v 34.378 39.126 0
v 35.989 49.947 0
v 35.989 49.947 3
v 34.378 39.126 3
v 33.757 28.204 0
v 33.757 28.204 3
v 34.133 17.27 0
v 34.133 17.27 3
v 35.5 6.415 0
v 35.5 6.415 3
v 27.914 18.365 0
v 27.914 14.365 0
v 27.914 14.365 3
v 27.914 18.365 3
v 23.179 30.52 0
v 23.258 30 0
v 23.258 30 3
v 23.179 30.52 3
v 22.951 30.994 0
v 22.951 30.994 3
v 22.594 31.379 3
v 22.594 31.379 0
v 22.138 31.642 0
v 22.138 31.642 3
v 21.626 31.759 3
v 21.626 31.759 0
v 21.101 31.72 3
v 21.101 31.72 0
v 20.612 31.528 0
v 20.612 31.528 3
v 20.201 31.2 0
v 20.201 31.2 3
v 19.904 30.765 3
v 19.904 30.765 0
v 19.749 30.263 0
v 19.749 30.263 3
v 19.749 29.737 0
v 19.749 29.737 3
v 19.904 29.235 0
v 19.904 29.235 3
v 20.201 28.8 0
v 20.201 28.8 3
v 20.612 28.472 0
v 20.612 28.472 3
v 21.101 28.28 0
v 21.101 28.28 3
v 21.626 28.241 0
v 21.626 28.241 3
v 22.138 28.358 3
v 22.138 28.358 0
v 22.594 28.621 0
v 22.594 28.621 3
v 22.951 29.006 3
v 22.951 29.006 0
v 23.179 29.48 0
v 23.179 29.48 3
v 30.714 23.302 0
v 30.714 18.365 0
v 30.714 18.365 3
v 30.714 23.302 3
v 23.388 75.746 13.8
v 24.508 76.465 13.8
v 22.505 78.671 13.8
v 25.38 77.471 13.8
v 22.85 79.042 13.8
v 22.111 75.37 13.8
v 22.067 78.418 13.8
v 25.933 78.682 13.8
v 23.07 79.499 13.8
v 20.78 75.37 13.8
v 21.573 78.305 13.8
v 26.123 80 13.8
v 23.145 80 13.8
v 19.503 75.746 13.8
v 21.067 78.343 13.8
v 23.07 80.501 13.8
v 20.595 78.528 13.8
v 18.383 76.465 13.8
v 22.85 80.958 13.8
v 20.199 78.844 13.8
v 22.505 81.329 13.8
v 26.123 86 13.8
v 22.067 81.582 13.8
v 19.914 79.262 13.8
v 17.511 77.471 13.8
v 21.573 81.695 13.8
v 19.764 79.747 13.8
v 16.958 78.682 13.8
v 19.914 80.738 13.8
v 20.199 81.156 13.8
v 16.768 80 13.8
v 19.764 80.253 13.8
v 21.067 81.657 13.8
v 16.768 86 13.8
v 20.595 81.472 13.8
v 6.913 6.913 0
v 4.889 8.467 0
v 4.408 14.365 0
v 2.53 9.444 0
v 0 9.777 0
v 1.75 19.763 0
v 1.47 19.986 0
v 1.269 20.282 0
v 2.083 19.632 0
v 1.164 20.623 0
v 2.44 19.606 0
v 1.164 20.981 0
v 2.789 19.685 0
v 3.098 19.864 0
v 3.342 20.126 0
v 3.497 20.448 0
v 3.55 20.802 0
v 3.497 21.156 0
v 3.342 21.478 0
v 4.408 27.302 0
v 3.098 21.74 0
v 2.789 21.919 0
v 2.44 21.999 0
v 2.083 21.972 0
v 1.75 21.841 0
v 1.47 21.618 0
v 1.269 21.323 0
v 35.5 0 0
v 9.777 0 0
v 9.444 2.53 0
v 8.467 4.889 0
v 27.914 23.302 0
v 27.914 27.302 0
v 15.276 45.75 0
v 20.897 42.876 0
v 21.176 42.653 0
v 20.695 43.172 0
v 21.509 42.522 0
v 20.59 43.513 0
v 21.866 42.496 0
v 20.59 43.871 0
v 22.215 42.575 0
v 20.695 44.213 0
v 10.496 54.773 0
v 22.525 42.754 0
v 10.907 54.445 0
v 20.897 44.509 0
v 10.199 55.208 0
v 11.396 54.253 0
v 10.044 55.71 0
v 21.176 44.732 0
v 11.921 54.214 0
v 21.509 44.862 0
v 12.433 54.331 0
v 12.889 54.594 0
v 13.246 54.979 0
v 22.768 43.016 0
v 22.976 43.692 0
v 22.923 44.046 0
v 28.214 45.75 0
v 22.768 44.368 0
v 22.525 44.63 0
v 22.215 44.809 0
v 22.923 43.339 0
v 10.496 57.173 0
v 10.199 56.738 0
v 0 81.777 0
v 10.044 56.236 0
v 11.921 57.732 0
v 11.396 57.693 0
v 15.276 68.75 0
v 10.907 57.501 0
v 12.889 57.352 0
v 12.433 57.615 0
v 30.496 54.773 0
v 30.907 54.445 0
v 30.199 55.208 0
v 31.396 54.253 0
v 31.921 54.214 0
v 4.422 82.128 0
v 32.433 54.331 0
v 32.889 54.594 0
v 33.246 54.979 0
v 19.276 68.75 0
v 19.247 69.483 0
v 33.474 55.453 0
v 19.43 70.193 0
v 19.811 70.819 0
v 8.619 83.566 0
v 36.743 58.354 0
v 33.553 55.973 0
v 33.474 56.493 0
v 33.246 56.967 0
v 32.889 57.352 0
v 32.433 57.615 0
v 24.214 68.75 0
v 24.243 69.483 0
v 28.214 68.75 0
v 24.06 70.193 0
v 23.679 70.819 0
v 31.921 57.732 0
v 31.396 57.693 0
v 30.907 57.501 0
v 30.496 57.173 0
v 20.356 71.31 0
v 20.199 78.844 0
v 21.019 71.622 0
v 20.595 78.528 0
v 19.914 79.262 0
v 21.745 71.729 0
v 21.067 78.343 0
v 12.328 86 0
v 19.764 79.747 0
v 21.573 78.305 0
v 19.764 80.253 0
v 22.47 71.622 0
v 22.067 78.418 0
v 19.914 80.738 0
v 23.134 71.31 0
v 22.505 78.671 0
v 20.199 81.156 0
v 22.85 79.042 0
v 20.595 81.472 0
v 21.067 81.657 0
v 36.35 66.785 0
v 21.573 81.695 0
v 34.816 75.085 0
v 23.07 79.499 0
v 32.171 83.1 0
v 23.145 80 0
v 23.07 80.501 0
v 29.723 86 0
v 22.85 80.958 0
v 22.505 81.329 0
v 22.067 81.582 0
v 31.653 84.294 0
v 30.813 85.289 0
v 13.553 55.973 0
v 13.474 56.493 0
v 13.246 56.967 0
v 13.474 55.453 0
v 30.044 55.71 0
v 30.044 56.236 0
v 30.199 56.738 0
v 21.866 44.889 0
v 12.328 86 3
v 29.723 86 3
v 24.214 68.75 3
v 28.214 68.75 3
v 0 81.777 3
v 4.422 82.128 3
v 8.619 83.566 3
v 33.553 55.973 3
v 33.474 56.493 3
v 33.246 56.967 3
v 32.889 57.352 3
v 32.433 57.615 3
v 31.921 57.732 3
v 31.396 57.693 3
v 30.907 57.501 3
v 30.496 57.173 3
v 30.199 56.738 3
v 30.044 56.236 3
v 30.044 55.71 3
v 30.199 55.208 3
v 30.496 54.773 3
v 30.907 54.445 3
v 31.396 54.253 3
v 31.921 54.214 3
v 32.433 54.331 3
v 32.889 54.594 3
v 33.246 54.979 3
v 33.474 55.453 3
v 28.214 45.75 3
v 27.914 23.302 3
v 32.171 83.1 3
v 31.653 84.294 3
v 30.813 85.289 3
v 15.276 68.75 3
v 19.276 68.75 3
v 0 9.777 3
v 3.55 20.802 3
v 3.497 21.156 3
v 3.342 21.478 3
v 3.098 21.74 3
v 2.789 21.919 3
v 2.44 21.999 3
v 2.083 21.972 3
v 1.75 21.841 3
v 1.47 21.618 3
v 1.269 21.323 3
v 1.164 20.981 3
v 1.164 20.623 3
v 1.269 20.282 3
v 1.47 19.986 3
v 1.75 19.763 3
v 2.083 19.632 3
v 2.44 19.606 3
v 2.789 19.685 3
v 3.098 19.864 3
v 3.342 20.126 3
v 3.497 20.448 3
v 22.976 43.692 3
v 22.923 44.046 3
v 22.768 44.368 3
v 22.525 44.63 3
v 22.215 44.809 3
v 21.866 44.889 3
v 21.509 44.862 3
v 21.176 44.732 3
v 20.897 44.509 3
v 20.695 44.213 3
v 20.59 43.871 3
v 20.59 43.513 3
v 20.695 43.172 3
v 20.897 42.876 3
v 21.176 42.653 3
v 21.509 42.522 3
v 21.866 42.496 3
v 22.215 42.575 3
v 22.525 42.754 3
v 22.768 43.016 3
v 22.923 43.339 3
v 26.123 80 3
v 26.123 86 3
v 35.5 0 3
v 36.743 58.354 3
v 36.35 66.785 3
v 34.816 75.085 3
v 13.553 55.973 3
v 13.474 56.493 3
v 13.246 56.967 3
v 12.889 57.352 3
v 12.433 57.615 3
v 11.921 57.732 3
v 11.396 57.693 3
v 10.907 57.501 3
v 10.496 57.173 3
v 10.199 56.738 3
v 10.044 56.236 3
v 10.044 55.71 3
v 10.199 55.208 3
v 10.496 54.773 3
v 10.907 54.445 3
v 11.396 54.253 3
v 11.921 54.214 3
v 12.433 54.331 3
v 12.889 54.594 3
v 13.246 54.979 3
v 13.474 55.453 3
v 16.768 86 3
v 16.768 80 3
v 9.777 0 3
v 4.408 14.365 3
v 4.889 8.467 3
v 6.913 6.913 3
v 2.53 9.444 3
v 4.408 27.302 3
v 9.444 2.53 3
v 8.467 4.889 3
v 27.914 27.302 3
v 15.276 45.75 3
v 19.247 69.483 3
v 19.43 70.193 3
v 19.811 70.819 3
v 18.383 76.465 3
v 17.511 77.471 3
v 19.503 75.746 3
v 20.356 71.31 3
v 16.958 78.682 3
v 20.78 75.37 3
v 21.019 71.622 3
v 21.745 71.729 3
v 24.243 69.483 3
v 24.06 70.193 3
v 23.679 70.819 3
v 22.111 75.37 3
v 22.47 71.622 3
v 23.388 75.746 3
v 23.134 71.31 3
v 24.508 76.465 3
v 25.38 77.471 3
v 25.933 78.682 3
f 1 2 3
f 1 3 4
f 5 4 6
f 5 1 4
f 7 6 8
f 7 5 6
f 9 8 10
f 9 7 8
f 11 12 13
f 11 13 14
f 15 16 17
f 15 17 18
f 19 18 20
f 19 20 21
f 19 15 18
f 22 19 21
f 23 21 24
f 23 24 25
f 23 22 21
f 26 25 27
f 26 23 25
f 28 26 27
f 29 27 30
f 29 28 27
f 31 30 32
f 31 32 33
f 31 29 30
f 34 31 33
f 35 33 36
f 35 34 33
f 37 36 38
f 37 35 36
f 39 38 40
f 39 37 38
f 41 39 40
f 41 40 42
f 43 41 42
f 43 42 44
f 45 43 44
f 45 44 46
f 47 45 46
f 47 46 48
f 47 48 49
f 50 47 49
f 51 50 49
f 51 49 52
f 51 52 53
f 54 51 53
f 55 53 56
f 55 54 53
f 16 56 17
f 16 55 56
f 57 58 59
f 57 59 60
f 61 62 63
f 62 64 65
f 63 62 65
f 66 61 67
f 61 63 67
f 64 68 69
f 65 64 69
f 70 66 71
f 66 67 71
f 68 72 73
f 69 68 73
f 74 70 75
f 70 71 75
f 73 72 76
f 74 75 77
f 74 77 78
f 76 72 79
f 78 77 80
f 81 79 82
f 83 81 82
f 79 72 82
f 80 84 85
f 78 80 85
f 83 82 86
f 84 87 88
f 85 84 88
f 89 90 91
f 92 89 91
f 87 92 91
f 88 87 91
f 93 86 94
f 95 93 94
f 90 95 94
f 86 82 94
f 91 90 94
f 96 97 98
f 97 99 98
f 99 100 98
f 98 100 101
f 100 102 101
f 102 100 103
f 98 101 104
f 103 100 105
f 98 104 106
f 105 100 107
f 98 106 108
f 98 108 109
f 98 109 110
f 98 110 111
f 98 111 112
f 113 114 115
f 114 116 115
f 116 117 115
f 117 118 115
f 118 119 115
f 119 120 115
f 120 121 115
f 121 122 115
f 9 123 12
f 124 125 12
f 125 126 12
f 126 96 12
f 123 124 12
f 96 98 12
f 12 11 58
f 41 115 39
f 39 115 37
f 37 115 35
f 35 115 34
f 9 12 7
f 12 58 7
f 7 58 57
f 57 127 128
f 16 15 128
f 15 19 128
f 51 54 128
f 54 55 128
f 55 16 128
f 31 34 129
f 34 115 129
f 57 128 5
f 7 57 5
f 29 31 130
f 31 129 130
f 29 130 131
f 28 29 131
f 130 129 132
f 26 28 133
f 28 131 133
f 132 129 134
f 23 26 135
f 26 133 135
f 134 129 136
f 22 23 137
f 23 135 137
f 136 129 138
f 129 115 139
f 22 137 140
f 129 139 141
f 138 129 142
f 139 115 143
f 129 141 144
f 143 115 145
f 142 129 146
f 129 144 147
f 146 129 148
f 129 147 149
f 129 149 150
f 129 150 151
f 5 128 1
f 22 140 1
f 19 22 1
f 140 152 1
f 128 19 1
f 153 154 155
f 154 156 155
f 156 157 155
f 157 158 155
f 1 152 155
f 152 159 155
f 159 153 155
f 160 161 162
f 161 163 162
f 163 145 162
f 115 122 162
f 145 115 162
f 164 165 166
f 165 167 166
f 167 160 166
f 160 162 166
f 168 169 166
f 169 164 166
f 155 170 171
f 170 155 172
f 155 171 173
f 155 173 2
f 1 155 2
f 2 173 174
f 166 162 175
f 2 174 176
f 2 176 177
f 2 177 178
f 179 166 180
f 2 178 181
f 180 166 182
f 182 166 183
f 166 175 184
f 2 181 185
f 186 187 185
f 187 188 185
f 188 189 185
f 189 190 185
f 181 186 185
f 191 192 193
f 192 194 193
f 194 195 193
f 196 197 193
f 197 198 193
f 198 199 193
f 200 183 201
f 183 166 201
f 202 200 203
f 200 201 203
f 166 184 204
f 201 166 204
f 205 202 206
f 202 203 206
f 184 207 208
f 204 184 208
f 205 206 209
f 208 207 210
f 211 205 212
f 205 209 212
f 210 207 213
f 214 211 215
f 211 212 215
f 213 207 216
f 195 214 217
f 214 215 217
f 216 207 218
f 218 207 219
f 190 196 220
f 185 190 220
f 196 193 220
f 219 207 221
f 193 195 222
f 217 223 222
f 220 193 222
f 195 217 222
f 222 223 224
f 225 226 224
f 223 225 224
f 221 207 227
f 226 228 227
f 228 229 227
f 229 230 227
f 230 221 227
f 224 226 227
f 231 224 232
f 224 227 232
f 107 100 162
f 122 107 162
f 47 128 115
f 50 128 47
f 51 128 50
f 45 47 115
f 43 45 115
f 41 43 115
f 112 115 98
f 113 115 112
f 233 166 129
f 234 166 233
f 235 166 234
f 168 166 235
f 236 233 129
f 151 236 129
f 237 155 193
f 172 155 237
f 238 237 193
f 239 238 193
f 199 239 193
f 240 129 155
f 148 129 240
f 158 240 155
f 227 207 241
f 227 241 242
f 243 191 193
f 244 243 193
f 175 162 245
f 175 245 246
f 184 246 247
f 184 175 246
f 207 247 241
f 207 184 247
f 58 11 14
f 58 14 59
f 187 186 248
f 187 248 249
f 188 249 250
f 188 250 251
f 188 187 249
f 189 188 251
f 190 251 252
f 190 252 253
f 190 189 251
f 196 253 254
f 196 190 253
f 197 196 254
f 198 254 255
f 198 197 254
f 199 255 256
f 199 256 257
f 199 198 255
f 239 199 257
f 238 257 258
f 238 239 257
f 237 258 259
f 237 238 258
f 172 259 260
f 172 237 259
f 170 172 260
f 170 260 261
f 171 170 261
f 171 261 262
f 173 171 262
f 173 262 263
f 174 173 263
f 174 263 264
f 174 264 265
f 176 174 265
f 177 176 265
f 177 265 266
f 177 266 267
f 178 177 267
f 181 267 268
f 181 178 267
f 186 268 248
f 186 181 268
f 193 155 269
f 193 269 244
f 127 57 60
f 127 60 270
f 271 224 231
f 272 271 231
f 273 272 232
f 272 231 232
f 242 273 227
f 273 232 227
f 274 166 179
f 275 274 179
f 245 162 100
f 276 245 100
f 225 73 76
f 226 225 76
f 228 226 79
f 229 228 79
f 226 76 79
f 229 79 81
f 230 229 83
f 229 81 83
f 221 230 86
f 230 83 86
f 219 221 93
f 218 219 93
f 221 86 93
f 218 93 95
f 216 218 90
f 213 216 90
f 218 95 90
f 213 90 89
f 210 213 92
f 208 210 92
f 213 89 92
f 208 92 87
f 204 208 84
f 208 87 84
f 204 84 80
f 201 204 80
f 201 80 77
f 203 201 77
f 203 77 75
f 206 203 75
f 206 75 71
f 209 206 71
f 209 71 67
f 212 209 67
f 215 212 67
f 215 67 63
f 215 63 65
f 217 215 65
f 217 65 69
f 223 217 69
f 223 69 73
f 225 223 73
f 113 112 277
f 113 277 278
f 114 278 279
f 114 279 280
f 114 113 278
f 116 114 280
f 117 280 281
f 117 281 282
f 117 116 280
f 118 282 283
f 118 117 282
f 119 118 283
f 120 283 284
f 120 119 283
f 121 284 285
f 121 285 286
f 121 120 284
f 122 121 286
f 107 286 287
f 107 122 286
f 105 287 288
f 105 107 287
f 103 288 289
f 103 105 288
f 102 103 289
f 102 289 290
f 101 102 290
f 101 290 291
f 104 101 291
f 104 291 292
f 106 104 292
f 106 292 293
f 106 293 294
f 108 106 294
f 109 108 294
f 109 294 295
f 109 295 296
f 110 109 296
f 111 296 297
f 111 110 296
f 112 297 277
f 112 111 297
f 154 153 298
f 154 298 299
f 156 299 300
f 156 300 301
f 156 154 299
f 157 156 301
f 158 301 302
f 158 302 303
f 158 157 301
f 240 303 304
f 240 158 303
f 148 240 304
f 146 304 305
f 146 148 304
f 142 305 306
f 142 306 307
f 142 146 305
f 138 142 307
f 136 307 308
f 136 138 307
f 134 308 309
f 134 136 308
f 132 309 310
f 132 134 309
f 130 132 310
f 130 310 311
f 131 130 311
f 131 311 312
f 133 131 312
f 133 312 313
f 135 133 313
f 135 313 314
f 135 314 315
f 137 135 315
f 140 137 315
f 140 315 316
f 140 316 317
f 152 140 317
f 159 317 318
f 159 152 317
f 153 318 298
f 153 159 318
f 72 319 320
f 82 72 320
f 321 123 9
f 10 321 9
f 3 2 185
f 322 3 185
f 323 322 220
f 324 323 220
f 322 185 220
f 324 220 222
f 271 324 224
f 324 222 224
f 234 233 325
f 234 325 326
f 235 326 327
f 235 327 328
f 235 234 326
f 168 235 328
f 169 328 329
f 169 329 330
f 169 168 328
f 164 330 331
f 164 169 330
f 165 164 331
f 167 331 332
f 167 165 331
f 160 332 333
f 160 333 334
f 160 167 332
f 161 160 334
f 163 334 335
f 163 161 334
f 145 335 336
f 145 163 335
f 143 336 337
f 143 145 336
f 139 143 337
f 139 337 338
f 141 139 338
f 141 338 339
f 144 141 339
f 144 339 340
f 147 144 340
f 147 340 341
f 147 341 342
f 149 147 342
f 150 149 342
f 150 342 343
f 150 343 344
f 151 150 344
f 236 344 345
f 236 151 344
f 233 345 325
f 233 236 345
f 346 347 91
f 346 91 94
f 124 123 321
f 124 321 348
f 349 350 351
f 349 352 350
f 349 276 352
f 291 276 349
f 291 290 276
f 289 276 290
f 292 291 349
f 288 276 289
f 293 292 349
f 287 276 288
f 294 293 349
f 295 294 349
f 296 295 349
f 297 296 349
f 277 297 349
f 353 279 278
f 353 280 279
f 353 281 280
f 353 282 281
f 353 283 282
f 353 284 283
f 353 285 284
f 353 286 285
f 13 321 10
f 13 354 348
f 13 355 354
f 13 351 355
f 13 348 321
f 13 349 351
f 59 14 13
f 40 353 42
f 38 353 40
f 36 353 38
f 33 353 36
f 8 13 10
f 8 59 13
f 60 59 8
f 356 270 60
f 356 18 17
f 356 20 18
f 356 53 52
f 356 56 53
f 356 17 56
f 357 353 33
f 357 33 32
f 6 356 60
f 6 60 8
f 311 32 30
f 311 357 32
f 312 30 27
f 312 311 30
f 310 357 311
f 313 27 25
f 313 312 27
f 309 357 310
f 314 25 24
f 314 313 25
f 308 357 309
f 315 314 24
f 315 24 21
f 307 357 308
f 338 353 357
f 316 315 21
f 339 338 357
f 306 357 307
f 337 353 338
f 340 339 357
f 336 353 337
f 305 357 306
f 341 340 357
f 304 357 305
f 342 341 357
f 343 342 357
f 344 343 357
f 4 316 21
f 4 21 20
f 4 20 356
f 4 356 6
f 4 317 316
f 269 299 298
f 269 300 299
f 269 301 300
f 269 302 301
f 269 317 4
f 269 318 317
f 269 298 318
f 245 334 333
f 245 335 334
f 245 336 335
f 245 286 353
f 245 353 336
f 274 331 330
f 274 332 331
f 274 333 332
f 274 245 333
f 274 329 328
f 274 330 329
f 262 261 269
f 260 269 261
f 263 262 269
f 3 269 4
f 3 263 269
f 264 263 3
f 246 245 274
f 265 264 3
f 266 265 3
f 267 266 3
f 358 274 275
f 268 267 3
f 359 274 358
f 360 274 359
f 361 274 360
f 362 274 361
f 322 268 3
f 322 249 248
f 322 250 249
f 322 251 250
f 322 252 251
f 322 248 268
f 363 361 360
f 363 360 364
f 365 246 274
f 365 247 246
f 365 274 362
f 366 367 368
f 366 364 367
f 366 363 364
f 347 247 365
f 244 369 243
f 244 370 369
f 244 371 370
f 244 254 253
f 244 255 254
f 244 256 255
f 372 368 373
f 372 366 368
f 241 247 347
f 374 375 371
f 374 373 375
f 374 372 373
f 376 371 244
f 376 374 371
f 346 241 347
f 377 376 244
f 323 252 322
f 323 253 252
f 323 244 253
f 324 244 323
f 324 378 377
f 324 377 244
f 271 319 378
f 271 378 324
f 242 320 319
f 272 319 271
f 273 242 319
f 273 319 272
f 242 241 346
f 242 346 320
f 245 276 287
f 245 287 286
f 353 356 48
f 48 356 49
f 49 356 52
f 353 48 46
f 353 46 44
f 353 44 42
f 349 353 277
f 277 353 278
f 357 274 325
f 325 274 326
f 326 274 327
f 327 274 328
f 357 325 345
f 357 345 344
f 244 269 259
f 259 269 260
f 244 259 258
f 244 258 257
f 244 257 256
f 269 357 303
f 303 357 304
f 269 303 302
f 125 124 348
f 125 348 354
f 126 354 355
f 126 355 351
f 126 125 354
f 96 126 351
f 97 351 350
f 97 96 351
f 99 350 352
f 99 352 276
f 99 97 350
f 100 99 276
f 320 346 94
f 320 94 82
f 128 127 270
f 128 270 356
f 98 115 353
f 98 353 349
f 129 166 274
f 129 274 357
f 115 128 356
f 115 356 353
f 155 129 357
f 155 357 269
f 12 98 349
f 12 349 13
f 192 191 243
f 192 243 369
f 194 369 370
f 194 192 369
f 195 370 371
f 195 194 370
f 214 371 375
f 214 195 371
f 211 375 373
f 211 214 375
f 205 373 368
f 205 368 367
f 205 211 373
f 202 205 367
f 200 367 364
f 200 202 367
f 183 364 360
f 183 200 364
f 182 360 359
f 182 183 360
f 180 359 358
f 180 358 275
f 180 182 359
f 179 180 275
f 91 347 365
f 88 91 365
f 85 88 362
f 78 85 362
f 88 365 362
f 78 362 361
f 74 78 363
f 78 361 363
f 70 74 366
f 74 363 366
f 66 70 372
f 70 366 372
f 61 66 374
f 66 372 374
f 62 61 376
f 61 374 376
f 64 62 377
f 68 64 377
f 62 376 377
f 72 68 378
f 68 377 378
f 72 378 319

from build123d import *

# Parameters (mm, degrees)
SKETCH033_R        = 1.2
SKETCH033_R_2      = 1.764044
PAD020_DEPTH       = 3
PAD029_DEPTH       = 10.8
SKETCH046_R        = 1.7
POCKET003022_DEPTH = 20


with BuildPart() as part:
    # Sketch033 → Pad020 (new body)
    with BuildSketch(Plane.XY):
        with BuildLine():
            Line((35.5, 0), (35.5, 6.415183))
            ThreePointArc((35.988725, 49.947313), (33.757449, 28.203554), (35.5, 6.415183))
            ThreePointArc((35.988725, 49.947313), (36.349691, 66.784913), (32.171358, 83.099833))
            ThreePointArc((32.171358, 83.099833), (31.269586, 84.821896), (29.723476, 86.000133))
            Line((12.328447, 86.000133), (29.723476, 86.000133))
            ThreePointArc((0, 81.7771), (6.566085, 82.715448), (12.328447, 86.000133))
            Line((0, 81.7771), (0, 9.7771))
            ThreePointArc((9.7771, 0), (6.913454, 6.913454), (0, 9.7771))
            Line((35.5, 0), (9.7771, 0))
        make_face()
        with Locations((2.350144, 20.802189)):
            Circle(SKETCH033_R, mode=Mode.SUBTRACT)
        with Locations((21.7765, 43.6923)):
            Circle(SKETCH033_R, mode=Mode.SUBTRACT)
        with Locations((11.788759, 55.9729)):
            Circle(SKETCH033_R_2, mode=Mode.SUBTRACT)
        with Locations((31.788759, 55.9729)):
            Circle(SKETCH033_R_2, mode=Mode.SUBTRACT)
        with Locations((21.493771, 30)):
            Circle(SKETCH033_R_2, mode=Mode.SUBTRACT)
        Polygon((27.914344, 27.302489), (4.407844, 27.302489), (4.407844, 14.365089), (27.914344, 14.365089), (27.914344, 18.365089), (30.714344, 18.365089), (30.714344, 23.302489), (27.914344, 23.302489), align=None, mode=Mode.SUBTRACT)
        with BuildLine():
            Line((15.2762, 68.75), (15.2762, 45.75))
            Line((15.2762, 45.75), (28.2136, 45.75))
            Line((28.2136, 45.75), (28.2136, 68.75))
            Line((24.2136, 68.75), (28.2136, 68.75))
            ThreePointArc((24.2136, 68.75), (21.7449, 71.728653), (19.2762, 68.75))
            Line((15.2762, 68.75), (19.2762, 68.75))
        make_face(mode=Mode.SUBTRACT)
    extrude(amount=PAD020_DEPTH)

    # Sketch045 → Pad029 (new body)
    with BuildSketch(Plane.XY.offset(3)):
        with BuildLine():
            Line((16.768312, 79.999998), (16.768312, 86))
            Line((16.768312, 86), (26.122612, 86))
            Line((26.122612, 79.999999), (26.122612, 86))
            ThreePointArc((16.768312, 79.999998), (21.445462, 75.32285), (26.122612, 79.999999))
        make_face()
    extrude(amount=PAD029_DEPTH)

    # Sketch046 → Pocket003022 (cut)
    with BuildSketch(Plane.XY.offset(13.8)):
        with Locations((21.445462, 80)):
            Circle(SKETCH046_R)
    extrude(amount=-POCKET003022_DEPTH, mode=Mode.SUBTRACT)


solid = part.part
